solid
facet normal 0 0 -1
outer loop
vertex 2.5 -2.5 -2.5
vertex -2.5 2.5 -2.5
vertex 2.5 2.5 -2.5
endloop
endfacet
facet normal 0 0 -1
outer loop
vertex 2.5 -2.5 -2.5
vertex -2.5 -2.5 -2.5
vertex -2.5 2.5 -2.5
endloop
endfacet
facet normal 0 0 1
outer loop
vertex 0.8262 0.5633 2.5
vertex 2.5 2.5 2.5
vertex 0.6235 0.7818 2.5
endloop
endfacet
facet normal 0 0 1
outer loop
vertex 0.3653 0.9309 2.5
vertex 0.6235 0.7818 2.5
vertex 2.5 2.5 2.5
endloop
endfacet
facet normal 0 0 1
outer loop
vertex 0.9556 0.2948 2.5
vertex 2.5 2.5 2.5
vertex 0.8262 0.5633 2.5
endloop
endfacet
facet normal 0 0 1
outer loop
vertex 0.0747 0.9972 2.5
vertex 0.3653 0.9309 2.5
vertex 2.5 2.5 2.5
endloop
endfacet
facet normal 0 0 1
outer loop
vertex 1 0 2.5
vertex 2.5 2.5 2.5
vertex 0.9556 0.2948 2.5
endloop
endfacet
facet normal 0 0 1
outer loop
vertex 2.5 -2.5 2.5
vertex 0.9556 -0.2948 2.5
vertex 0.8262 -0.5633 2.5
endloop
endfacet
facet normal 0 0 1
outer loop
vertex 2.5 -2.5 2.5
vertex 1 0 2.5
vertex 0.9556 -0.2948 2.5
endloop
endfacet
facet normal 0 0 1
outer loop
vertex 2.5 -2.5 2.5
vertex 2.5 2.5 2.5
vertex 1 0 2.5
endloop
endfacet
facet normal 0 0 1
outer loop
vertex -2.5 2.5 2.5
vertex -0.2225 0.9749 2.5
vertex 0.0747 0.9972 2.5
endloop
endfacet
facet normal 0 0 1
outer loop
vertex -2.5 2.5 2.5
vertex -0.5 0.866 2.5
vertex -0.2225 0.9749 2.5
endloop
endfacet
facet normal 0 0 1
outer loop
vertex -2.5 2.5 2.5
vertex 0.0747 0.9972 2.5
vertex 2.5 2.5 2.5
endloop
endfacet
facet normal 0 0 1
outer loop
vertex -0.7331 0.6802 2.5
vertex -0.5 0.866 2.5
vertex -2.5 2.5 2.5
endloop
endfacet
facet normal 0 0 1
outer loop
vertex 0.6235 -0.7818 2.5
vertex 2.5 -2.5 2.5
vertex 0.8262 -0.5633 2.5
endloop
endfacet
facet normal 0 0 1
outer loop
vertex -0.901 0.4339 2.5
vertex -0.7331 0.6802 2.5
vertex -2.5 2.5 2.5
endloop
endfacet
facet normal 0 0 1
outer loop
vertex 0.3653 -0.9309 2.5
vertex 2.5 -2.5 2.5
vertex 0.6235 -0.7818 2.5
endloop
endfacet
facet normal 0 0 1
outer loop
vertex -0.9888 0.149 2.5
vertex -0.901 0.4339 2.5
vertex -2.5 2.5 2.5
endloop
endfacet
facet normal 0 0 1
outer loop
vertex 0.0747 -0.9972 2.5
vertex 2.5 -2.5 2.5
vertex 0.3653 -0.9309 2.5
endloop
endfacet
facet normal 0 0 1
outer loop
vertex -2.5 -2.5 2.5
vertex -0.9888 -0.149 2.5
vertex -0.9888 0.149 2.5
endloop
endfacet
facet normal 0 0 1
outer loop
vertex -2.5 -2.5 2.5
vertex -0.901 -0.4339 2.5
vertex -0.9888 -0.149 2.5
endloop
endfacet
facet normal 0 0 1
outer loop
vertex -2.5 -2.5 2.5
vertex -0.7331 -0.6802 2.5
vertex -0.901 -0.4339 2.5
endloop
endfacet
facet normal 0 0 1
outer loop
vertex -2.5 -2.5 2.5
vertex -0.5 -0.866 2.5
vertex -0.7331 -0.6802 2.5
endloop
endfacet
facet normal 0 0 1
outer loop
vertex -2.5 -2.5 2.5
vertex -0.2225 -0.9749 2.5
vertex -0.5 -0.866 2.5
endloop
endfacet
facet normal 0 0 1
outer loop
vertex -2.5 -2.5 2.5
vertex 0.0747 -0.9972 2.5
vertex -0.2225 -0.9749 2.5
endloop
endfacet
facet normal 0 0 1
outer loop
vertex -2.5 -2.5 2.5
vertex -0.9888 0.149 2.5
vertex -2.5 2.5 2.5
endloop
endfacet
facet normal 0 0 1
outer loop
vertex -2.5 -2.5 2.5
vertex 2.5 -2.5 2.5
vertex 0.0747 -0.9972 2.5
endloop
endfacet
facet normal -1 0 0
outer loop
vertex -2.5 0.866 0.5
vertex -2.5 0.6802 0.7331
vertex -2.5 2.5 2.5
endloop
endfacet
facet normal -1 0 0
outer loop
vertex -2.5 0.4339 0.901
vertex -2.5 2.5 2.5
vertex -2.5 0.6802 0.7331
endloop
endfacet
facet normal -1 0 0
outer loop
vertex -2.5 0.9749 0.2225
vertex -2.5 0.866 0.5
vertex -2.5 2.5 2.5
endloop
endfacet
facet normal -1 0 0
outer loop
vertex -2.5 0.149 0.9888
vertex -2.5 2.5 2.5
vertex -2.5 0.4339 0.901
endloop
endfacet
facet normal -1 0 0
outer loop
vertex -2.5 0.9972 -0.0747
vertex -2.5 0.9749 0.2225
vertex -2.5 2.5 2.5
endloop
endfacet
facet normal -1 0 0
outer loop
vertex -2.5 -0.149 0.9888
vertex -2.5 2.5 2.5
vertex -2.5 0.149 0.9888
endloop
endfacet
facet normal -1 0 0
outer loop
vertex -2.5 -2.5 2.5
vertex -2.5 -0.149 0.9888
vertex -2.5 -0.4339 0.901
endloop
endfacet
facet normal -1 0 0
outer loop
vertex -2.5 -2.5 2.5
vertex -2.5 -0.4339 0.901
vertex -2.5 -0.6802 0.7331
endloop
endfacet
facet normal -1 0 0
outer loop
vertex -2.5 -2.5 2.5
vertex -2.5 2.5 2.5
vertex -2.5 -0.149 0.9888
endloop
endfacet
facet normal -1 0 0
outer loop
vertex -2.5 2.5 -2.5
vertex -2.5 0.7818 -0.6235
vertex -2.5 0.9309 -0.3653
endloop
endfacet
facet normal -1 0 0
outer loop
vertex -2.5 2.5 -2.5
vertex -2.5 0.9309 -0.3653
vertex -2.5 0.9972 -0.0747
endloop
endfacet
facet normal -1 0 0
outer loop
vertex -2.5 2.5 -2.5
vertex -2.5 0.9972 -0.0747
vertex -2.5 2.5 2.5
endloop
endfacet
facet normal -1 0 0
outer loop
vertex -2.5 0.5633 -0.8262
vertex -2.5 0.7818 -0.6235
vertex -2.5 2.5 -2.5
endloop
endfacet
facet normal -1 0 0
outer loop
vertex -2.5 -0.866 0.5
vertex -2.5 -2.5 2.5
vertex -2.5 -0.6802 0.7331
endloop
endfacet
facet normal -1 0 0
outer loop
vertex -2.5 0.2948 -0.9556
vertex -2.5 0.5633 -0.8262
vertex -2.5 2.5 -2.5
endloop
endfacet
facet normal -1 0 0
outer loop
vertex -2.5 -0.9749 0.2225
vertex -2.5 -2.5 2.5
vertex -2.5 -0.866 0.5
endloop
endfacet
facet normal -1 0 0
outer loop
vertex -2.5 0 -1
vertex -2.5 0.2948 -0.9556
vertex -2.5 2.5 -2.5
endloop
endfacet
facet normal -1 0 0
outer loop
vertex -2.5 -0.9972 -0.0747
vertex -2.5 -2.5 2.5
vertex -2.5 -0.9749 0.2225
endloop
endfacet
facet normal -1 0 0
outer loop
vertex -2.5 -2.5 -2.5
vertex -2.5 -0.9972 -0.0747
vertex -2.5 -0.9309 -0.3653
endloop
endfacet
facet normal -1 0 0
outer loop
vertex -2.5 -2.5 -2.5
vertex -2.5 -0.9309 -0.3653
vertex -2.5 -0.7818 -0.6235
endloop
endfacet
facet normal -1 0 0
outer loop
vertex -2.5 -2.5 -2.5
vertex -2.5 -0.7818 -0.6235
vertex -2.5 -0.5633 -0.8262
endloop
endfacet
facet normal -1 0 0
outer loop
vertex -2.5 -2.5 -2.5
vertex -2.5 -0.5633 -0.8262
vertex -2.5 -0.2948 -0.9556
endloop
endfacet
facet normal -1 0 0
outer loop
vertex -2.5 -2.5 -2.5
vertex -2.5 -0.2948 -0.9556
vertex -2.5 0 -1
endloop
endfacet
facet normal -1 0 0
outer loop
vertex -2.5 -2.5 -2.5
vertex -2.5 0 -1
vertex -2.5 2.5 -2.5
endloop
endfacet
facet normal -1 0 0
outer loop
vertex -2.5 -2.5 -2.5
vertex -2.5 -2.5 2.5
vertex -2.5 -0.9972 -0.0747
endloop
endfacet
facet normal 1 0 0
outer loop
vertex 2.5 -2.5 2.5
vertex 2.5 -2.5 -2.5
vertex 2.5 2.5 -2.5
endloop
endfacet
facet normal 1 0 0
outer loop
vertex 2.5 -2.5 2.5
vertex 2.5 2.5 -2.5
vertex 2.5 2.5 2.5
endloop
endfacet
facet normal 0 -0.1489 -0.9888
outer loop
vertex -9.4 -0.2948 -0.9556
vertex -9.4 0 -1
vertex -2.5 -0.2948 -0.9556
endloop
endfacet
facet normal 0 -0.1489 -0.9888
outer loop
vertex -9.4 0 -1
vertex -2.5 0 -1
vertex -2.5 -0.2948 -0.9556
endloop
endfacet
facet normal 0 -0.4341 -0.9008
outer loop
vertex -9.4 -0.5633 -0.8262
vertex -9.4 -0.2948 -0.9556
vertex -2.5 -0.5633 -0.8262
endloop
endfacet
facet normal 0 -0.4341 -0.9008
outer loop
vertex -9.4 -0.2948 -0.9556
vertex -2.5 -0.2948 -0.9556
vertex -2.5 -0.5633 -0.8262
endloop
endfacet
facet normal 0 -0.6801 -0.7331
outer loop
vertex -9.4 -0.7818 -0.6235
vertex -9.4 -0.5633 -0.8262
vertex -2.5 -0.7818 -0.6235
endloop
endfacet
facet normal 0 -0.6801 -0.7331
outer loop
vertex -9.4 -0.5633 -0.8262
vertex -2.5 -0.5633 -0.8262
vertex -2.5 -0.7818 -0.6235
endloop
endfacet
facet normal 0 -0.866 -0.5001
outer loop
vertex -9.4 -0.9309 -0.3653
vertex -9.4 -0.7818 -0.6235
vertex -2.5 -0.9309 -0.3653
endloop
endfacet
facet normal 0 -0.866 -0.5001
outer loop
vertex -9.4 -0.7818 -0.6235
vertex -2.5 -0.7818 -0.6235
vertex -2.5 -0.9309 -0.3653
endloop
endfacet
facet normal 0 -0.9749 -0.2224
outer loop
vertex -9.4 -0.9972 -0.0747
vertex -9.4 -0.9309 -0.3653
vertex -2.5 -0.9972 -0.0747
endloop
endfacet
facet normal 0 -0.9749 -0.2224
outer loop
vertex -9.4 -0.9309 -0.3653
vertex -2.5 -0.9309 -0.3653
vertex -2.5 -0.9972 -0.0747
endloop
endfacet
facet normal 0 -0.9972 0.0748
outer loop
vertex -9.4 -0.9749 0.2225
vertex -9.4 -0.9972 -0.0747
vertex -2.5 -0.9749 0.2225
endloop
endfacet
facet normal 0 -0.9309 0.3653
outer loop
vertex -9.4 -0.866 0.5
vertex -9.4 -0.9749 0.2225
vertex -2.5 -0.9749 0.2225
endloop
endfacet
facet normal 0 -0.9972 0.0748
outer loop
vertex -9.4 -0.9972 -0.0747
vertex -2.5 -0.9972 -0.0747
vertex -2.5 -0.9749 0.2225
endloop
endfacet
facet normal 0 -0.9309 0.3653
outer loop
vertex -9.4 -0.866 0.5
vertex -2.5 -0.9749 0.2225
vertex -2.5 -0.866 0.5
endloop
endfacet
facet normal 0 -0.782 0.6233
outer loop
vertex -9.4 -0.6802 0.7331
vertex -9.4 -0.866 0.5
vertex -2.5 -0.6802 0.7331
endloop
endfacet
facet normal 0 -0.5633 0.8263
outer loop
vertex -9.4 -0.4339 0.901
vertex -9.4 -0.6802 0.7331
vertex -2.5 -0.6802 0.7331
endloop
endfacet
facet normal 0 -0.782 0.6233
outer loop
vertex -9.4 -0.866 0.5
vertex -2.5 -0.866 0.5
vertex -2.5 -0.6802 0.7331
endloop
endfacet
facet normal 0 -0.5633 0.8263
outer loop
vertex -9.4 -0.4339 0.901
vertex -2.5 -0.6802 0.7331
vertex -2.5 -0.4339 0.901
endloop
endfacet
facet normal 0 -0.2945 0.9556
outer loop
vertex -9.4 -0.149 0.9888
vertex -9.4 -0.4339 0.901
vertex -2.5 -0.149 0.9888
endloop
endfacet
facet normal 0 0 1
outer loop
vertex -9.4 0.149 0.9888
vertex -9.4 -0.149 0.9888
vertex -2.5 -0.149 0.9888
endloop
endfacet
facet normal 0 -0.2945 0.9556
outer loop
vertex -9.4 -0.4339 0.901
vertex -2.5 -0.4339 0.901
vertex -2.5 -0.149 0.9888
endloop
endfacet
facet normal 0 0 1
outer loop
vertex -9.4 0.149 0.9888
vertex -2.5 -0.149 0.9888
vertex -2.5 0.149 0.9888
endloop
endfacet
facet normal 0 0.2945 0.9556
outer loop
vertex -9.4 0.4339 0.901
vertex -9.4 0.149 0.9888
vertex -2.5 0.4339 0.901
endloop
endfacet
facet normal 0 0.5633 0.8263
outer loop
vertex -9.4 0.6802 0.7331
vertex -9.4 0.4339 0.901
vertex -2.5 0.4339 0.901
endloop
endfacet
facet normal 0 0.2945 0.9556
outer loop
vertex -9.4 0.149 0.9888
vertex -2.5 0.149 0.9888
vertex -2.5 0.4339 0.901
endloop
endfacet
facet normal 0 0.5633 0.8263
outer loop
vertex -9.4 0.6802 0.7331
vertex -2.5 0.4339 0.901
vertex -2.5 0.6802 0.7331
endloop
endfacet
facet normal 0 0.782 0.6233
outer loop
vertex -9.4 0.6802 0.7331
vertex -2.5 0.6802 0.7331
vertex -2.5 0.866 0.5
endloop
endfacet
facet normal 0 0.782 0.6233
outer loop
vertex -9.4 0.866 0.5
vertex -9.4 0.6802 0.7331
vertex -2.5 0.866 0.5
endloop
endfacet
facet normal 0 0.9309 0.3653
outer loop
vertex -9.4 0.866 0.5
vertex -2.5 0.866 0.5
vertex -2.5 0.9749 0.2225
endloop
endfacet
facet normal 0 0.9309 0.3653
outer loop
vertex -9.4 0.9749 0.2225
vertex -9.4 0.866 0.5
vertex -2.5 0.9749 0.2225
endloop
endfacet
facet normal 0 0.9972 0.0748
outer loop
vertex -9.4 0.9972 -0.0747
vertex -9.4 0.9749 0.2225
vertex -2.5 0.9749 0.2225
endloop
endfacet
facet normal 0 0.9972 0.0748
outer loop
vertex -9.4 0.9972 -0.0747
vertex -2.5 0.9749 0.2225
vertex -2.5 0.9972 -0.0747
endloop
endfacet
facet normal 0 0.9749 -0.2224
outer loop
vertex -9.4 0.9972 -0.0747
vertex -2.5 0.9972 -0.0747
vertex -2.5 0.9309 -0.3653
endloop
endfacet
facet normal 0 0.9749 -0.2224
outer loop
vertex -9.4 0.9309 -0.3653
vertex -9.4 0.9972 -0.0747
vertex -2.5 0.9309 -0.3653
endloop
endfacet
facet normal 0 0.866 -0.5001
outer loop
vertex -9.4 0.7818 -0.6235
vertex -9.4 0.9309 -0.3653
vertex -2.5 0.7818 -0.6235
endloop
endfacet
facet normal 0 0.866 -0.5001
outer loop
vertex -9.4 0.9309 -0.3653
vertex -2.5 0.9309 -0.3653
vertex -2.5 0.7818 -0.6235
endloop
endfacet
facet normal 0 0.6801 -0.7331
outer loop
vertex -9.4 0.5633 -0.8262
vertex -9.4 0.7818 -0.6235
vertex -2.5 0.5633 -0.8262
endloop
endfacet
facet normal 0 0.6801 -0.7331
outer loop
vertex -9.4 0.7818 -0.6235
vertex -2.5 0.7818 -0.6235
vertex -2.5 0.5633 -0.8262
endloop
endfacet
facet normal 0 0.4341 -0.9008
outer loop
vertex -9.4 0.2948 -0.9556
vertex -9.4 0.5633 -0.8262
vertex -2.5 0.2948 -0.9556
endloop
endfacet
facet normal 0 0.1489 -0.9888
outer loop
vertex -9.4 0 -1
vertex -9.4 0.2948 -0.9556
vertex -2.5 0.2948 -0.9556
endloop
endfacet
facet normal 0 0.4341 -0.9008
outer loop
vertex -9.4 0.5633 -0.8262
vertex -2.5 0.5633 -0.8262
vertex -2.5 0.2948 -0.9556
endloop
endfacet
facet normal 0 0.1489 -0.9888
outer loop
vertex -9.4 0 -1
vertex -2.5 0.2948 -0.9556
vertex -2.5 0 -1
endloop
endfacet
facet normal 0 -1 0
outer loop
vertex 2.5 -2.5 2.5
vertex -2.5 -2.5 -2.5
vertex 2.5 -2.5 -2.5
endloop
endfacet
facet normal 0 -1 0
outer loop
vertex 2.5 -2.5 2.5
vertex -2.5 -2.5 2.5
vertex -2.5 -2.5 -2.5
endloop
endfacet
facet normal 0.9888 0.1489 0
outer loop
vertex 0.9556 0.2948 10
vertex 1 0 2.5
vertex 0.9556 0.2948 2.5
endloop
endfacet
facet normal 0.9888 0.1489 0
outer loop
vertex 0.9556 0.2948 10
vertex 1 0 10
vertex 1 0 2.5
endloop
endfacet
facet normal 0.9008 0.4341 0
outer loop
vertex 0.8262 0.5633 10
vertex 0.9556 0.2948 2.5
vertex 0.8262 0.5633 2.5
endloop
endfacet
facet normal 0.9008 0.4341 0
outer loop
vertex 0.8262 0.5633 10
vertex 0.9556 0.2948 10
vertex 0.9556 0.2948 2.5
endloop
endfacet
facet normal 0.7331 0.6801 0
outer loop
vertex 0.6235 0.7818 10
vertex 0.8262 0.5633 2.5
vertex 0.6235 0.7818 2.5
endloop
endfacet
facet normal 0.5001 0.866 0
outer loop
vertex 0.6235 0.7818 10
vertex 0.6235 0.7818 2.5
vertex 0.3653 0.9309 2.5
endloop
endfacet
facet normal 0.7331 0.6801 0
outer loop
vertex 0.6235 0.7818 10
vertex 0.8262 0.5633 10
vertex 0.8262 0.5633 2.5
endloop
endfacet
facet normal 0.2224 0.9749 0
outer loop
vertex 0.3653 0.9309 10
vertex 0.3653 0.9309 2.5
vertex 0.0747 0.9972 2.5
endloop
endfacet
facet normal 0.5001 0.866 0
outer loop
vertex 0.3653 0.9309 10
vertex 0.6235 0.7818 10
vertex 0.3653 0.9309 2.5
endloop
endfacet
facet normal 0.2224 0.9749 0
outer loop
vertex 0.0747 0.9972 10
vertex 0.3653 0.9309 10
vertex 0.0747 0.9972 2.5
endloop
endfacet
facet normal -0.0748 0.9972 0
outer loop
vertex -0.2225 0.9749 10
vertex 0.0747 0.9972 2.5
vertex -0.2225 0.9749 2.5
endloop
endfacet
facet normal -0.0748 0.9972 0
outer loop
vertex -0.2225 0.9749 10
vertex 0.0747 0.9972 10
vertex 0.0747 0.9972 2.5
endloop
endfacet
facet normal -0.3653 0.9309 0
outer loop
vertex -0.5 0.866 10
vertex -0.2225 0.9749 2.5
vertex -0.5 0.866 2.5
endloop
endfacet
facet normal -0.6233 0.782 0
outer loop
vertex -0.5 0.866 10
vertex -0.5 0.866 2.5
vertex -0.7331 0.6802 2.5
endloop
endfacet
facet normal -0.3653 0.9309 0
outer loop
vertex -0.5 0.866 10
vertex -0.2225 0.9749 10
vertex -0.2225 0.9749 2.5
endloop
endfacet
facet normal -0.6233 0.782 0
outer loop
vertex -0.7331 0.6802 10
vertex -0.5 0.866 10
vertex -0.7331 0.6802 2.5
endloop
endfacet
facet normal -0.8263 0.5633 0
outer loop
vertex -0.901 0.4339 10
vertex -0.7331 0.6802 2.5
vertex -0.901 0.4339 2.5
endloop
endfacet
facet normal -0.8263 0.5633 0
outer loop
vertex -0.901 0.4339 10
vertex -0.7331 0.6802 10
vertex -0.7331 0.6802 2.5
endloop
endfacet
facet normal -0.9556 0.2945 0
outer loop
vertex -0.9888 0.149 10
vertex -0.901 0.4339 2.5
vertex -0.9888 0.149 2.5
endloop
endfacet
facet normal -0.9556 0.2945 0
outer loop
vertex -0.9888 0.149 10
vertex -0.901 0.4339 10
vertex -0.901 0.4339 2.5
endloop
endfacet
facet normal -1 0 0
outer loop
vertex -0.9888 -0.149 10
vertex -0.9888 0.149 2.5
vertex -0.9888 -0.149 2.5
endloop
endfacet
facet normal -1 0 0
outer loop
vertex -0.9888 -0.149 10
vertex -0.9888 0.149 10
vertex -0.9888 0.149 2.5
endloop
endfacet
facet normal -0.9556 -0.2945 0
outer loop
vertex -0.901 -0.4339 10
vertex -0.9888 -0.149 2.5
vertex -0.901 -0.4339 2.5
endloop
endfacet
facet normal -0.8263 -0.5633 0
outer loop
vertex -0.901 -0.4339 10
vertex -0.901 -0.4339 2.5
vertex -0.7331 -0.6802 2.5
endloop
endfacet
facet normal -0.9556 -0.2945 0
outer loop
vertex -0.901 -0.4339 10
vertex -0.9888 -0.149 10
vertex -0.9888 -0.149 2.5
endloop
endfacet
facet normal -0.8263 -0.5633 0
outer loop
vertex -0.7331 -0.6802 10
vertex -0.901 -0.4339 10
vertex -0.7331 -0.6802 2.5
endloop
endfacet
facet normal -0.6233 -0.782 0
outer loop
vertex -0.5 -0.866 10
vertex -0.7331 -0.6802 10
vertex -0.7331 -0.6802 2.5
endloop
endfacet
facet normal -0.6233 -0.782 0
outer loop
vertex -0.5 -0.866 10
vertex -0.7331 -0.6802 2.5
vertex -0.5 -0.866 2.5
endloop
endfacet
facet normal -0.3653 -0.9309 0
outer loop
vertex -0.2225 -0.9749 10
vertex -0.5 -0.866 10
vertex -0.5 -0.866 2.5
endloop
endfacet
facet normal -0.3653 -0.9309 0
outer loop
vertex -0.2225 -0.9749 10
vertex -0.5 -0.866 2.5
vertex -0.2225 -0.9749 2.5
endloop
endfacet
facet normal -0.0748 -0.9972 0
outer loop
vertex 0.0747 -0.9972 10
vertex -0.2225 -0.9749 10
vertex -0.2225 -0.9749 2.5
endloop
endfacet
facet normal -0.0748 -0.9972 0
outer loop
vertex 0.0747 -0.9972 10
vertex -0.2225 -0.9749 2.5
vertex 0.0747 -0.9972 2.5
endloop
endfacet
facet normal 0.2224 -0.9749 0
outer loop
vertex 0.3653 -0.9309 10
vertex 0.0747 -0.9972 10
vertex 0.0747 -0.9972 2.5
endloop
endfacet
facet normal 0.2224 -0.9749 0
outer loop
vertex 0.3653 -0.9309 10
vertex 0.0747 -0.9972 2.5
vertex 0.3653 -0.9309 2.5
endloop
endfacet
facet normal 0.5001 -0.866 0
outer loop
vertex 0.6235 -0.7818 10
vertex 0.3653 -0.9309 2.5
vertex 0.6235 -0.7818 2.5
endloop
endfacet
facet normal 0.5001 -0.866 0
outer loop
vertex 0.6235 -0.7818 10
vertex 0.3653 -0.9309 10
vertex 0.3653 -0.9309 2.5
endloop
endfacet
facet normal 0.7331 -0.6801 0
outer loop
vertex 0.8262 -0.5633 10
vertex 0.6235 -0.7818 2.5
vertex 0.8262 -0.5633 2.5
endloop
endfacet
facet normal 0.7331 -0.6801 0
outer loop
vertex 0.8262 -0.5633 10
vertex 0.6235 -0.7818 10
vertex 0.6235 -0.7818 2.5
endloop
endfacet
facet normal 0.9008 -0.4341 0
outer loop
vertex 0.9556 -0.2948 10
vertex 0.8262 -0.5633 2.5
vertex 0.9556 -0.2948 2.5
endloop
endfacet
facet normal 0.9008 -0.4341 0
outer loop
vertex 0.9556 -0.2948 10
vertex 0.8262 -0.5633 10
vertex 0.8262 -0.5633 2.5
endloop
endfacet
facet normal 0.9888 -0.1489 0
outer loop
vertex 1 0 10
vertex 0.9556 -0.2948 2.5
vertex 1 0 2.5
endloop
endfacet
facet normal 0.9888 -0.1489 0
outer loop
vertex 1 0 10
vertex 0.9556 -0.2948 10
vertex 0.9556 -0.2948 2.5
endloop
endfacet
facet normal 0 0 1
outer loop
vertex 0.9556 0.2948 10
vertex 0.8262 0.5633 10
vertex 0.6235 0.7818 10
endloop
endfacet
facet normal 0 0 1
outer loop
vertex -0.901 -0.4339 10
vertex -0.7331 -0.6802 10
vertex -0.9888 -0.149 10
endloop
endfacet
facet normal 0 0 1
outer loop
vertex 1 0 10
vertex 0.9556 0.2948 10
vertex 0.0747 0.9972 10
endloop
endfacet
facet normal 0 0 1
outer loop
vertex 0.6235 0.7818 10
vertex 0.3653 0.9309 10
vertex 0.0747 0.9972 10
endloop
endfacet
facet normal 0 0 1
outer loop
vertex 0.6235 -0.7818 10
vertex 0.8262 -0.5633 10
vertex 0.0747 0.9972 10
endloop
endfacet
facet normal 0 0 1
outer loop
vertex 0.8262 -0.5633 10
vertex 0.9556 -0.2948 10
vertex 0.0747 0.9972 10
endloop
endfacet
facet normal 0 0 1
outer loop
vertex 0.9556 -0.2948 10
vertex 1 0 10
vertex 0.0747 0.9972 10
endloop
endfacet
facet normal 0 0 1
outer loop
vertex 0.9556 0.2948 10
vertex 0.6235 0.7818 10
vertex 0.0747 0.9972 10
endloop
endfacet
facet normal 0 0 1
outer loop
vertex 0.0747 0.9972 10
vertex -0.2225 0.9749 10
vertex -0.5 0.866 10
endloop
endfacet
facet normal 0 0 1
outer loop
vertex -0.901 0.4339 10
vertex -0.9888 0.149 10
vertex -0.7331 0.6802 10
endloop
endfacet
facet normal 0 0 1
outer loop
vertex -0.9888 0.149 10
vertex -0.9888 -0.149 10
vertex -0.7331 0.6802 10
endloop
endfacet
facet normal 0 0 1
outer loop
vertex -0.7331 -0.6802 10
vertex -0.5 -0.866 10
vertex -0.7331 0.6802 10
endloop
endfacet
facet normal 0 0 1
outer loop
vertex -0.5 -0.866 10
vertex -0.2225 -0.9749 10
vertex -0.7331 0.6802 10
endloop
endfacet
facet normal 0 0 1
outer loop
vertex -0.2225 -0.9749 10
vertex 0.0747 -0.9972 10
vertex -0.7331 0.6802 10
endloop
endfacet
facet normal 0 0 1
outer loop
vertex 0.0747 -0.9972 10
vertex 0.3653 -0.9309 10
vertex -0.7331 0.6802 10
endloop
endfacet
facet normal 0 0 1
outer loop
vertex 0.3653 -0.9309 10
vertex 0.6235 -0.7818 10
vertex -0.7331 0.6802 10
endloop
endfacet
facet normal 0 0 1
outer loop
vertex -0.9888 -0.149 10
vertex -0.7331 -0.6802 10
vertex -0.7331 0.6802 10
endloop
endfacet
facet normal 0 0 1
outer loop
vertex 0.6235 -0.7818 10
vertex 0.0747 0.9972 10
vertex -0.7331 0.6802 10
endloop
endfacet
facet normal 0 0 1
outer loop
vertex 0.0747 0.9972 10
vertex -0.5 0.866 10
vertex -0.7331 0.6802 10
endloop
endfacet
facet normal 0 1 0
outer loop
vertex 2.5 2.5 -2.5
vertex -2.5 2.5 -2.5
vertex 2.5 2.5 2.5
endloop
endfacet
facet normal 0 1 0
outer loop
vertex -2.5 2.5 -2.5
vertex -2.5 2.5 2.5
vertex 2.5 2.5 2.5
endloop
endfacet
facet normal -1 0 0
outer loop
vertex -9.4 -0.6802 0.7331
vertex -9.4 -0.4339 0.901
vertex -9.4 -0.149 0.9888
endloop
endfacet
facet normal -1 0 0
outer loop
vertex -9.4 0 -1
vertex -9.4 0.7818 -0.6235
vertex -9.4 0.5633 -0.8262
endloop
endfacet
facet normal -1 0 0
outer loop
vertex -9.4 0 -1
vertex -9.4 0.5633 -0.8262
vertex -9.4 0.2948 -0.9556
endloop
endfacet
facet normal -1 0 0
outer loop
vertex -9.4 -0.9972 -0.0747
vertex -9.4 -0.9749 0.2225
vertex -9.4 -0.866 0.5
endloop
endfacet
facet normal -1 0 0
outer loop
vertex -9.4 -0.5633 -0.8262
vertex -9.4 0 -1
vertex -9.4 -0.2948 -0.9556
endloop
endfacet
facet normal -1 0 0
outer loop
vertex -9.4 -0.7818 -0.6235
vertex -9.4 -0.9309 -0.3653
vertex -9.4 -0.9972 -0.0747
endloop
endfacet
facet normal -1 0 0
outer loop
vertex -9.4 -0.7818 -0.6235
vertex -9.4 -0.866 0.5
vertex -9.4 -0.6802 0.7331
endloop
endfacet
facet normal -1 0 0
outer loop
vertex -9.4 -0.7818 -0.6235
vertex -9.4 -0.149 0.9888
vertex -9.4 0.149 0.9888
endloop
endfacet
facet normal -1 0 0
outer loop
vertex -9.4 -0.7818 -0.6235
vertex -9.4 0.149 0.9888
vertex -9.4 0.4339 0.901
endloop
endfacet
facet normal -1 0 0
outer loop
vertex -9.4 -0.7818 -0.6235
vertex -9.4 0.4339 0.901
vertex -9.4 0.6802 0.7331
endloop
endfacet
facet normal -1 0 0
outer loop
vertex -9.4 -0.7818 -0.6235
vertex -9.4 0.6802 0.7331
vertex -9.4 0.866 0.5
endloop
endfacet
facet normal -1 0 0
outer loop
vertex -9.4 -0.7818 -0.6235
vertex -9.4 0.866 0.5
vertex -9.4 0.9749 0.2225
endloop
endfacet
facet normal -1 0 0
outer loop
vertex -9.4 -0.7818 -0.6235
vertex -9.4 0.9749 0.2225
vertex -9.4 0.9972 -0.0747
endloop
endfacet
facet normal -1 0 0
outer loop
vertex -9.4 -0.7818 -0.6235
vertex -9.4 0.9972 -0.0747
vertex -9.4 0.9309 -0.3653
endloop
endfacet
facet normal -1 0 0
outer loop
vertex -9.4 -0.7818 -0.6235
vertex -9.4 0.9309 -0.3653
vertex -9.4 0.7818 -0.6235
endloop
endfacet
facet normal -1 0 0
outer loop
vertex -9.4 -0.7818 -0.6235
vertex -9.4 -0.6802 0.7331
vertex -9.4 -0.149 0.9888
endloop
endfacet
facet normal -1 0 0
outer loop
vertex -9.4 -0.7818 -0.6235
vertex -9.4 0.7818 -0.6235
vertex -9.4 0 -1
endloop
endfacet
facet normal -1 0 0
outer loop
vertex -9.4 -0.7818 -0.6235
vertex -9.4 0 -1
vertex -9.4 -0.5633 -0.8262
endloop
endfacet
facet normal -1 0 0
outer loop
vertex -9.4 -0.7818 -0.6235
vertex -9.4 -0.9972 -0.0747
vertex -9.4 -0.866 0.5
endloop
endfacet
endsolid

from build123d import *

# Parameters (mm, degrees)
F0_W     = 6.9
F0_H     = 1
F0_W_2   = 1
F0_H_2   = 7.5
F0_W_3   = 2.5
F0_H_3   = 2.5
F3_DEPTH = 2.5


with BuildPart() as f1:
    # F0 (on Front) → F1 (revolve)
    with BuildSketch(Plane.XZ):
        Polygon((1, -1), (0, 0), (-2.5, 0), (-2.5, -1), align=None)
        with Locations((-5.95, -0.5)):
            Rectangle(F0_W, F0_H)
    revolve(axis=Axis((-4.7, 0, 0), (-1, 0, 0)))

    # F0 (on Front) → F2 (revolve)
    with BuildSketch(Plane.XZ):
        with Locations((0.5, 6.25)):
            Rectangle(F0_W_2, F0_H_2)
        Polygon((0, 2.5), (0, 0), (1, -1), (1, 2.5), align=None)
    revolve(axis=Axis((0, 0, 5), (0, 0, 1)))

    # F0 (on Front) → F3 (join, symmetric)
    with BuildSketch(Plane.XZ):
        Polygon((1, 2.5), (1, -1), (-2.5, -1), (-2.5, -2.5), (2.5, -2.5), (2.5, 2.5), align=None)
        with Locations((-1.25, 1.25)):
            Rectangle(F0_W_3, F0_H_3)
        Polygon((0, 2.5), (0, 0), (1, -1), (1, 2.5), align=None)
        Polygon((1, -1), (0, 0), (-2.5, 0), (-2.5, -1), align=None)
    extrude(amount=F3_DEPTH, both=True)


solid = f1.part
